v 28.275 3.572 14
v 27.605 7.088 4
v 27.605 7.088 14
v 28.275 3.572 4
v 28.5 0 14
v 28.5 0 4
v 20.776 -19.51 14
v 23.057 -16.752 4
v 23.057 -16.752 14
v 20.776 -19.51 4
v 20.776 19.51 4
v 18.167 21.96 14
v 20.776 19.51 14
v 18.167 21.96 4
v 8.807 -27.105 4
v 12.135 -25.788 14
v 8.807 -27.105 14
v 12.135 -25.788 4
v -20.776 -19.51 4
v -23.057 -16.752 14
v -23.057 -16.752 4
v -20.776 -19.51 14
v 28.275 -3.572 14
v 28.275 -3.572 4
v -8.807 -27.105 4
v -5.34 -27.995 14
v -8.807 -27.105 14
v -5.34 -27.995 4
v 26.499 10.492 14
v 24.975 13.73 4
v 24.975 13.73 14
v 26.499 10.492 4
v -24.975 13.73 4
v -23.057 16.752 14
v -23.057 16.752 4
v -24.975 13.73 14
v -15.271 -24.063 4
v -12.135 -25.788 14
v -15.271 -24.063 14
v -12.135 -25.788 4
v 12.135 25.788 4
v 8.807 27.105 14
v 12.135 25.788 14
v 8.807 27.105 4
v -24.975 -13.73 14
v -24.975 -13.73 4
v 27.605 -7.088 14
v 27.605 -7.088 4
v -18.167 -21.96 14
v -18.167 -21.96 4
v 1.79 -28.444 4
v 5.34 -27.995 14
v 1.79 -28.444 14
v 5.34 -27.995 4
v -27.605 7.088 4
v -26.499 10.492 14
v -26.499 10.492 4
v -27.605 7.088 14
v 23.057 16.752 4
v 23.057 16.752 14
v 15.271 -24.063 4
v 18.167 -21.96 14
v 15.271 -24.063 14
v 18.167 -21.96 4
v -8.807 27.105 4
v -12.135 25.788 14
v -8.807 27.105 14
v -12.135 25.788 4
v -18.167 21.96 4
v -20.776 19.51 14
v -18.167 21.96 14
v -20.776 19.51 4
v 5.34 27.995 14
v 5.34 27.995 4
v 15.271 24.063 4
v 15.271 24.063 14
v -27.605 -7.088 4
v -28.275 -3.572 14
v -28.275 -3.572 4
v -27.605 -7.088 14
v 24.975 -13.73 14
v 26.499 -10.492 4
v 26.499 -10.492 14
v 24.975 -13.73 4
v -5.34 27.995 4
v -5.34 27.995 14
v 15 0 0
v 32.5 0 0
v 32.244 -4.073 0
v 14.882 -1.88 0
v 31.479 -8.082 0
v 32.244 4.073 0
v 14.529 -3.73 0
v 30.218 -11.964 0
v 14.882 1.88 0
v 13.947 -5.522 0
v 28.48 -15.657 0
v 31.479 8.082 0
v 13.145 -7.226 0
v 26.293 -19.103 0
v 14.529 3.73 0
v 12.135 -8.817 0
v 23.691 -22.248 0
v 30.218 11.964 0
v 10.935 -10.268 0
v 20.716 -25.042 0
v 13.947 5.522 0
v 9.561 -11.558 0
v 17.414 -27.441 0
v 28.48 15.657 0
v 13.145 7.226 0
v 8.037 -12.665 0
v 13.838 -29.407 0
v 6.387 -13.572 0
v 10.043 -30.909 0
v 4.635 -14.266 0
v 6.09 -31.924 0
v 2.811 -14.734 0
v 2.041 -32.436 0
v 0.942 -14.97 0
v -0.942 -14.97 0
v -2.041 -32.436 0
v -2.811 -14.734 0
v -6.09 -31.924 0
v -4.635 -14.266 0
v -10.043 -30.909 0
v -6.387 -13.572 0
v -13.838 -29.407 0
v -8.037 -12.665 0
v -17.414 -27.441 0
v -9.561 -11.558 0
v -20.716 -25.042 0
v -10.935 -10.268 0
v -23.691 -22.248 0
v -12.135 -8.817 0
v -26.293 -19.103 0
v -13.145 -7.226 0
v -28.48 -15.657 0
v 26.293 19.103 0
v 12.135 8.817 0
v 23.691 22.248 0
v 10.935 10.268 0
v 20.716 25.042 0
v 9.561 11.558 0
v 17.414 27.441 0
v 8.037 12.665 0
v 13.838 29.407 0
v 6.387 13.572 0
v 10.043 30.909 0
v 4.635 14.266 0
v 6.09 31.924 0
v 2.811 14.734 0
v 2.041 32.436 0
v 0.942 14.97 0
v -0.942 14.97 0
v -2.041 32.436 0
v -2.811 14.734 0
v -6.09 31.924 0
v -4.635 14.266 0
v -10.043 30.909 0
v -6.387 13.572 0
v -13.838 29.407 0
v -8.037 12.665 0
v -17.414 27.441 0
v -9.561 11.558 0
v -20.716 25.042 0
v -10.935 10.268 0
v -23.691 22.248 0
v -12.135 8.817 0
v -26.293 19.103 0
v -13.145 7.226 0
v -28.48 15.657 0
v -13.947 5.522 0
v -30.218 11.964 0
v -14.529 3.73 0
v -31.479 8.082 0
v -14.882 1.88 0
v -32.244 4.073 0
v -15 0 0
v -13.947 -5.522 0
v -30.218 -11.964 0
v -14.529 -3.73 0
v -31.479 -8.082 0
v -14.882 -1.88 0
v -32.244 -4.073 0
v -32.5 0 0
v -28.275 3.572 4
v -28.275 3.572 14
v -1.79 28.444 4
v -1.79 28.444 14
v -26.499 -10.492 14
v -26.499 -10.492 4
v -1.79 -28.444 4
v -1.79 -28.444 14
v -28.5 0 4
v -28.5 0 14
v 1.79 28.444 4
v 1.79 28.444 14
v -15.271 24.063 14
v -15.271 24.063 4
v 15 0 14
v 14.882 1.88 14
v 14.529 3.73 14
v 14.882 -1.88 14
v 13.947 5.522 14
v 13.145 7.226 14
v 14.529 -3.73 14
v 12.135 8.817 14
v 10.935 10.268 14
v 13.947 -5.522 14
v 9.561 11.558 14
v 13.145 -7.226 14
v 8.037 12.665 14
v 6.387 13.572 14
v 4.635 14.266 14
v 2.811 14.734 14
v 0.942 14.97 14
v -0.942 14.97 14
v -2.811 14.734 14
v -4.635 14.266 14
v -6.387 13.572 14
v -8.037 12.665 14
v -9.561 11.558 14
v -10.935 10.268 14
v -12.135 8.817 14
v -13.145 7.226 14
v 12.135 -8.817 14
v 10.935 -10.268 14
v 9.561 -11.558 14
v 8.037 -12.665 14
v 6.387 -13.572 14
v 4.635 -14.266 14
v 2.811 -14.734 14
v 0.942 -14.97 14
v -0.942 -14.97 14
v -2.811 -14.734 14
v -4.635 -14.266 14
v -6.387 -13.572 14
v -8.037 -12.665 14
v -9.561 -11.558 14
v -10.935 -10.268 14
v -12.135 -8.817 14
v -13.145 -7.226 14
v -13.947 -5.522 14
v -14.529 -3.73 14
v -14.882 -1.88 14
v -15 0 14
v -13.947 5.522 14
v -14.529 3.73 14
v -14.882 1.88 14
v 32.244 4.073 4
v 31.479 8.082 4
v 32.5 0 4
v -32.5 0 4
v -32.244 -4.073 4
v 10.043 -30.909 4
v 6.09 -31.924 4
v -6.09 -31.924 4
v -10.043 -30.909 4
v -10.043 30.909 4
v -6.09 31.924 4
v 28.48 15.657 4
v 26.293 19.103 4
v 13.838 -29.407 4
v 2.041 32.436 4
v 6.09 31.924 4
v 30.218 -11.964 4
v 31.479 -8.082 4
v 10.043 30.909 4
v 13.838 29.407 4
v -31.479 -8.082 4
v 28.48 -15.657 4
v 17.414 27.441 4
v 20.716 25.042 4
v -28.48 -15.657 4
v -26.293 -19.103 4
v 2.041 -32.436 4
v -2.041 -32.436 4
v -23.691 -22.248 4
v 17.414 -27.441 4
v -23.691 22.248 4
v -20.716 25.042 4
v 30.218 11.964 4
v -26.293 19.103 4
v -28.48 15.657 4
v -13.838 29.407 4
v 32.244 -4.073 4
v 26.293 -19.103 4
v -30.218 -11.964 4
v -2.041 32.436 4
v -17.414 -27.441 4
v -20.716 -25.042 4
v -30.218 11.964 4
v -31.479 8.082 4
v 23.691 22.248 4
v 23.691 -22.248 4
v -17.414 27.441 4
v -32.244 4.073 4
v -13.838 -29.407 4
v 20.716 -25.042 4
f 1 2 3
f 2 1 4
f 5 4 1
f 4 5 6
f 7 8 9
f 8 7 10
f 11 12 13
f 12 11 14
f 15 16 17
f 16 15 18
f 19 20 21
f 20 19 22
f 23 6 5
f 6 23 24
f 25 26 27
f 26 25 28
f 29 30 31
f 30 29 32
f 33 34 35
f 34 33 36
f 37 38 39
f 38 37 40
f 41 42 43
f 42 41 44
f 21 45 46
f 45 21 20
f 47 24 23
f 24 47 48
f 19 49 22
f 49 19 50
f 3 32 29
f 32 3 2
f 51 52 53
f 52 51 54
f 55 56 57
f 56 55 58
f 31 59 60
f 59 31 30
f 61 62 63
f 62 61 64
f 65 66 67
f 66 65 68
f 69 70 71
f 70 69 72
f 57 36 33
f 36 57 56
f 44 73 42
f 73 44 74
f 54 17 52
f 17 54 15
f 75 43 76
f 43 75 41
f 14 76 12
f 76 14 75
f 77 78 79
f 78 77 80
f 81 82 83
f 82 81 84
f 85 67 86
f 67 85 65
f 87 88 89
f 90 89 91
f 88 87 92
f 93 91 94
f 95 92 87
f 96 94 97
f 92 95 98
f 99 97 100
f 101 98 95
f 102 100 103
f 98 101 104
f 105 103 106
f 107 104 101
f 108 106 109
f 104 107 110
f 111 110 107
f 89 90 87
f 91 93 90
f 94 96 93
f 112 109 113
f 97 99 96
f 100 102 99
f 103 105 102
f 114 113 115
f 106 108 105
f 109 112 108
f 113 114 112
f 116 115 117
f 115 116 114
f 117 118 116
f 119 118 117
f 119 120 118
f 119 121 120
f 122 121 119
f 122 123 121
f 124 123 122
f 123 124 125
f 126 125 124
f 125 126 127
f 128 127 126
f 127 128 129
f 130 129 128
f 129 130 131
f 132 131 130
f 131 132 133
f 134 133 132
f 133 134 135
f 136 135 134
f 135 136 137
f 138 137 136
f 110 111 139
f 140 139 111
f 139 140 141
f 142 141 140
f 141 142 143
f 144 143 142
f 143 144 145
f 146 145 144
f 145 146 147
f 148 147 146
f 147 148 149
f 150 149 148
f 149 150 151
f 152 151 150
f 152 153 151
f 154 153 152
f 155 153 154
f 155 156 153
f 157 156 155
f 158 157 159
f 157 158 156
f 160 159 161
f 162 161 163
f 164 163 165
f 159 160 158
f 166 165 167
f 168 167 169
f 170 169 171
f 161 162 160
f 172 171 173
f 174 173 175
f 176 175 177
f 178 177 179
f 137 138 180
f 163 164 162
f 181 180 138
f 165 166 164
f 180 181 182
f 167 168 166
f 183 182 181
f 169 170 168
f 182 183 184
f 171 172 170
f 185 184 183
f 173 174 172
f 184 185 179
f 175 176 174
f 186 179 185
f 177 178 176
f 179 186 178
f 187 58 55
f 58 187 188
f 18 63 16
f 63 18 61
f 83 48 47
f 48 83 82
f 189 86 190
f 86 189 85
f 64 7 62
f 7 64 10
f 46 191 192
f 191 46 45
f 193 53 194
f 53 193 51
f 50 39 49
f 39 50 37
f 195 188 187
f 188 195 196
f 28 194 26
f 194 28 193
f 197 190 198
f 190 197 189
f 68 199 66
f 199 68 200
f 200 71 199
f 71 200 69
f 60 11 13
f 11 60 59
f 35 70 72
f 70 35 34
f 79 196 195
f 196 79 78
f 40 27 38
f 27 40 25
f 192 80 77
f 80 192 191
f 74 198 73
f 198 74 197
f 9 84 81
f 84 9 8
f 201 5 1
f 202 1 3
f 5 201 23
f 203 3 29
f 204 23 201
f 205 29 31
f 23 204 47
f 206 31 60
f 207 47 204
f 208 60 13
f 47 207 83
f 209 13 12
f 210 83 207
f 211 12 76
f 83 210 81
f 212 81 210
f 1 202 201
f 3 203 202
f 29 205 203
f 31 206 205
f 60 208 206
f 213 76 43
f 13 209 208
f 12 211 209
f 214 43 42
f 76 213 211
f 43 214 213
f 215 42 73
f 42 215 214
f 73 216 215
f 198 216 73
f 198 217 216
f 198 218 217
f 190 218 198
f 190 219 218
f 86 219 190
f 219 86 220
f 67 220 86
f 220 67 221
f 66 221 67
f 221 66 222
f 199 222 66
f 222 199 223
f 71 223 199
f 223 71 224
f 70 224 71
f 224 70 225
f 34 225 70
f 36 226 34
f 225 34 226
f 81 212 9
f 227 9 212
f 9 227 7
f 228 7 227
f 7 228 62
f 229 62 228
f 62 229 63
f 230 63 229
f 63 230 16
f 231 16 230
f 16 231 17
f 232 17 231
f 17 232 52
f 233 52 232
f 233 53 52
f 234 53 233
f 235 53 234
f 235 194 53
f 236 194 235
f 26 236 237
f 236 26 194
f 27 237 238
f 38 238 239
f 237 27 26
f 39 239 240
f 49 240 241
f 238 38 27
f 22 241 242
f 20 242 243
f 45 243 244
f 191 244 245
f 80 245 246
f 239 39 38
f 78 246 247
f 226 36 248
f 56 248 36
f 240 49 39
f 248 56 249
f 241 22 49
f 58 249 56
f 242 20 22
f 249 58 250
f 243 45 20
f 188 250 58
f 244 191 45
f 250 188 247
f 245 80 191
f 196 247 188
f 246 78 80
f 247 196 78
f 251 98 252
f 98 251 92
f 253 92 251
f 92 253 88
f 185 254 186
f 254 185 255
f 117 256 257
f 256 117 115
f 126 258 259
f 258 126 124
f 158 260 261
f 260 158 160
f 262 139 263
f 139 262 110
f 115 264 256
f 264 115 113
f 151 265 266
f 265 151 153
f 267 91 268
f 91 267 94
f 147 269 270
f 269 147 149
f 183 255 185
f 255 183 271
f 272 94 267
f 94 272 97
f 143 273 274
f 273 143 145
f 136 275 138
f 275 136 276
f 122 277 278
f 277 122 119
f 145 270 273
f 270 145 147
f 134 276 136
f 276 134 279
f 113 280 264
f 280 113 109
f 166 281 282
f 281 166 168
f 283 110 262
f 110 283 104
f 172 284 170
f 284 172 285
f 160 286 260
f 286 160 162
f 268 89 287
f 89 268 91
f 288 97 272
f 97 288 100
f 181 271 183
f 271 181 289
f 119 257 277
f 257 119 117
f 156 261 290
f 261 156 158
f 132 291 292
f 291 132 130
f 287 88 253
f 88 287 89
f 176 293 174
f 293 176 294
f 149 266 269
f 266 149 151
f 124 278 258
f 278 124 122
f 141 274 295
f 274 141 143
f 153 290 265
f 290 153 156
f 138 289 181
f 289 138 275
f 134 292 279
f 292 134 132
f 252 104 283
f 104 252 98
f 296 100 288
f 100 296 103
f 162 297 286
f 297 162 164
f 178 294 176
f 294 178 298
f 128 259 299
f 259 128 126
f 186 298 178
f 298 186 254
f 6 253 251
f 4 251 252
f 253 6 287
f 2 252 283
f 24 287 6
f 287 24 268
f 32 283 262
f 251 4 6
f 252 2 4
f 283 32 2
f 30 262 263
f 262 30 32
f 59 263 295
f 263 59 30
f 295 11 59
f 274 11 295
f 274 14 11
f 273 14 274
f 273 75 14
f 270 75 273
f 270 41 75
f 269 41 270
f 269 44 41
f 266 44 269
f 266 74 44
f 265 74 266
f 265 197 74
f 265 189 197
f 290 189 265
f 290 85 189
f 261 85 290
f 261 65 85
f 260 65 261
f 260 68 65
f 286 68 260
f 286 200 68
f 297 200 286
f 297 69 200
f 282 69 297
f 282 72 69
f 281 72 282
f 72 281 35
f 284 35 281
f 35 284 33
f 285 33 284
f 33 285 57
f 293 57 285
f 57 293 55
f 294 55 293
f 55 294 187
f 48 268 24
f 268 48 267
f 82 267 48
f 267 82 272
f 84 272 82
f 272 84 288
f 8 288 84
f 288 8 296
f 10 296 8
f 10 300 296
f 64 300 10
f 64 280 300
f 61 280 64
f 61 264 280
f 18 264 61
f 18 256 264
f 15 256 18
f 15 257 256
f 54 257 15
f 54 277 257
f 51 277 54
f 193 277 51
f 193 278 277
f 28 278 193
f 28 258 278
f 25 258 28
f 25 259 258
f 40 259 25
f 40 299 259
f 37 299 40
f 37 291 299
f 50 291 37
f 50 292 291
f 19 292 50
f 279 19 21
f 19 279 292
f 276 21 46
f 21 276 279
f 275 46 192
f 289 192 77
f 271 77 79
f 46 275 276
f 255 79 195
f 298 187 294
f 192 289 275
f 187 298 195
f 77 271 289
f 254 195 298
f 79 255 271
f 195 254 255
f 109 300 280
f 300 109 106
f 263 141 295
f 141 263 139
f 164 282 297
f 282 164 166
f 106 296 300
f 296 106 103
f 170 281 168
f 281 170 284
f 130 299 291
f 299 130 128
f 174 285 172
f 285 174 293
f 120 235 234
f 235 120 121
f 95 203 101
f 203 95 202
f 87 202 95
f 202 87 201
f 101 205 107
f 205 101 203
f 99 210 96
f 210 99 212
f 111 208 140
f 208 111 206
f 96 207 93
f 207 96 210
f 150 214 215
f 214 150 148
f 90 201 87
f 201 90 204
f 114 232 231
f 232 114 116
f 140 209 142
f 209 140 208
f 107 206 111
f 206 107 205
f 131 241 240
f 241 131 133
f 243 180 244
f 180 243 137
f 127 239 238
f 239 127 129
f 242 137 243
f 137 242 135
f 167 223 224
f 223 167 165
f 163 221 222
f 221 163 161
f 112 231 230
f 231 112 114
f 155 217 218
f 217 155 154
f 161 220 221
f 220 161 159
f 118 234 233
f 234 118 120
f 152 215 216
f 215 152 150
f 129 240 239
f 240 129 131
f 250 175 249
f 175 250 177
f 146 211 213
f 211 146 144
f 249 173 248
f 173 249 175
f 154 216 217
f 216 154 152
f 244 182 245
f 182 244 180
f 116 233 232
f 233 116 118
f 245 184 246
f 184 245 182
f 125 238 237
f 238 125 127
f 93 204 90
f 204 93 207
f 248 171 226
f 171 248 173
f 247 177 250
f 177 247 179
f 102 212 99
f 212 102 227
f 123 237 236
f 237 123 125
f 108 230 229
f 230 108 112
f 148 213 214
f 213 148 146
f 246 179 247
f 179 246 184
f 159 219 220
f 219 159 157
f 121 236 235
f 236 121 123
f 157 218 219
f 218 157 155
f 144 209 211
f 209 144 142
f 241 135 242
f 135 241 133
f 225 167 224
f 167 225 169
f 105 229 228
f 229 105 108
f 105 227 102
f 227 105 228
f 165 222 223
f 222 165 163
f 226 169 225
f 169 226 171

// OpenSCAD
//excelvan spool holder
$fn=50;
module spoolholder(id,od){
    odrim = od +8;
    difference(){
        union(){
            cylinder(h=14,d=od);
            cylinder(h=4,d=odrim);
        }
        cylinder(h=14,d=id);
    }
}

spoolholder(30,57);
